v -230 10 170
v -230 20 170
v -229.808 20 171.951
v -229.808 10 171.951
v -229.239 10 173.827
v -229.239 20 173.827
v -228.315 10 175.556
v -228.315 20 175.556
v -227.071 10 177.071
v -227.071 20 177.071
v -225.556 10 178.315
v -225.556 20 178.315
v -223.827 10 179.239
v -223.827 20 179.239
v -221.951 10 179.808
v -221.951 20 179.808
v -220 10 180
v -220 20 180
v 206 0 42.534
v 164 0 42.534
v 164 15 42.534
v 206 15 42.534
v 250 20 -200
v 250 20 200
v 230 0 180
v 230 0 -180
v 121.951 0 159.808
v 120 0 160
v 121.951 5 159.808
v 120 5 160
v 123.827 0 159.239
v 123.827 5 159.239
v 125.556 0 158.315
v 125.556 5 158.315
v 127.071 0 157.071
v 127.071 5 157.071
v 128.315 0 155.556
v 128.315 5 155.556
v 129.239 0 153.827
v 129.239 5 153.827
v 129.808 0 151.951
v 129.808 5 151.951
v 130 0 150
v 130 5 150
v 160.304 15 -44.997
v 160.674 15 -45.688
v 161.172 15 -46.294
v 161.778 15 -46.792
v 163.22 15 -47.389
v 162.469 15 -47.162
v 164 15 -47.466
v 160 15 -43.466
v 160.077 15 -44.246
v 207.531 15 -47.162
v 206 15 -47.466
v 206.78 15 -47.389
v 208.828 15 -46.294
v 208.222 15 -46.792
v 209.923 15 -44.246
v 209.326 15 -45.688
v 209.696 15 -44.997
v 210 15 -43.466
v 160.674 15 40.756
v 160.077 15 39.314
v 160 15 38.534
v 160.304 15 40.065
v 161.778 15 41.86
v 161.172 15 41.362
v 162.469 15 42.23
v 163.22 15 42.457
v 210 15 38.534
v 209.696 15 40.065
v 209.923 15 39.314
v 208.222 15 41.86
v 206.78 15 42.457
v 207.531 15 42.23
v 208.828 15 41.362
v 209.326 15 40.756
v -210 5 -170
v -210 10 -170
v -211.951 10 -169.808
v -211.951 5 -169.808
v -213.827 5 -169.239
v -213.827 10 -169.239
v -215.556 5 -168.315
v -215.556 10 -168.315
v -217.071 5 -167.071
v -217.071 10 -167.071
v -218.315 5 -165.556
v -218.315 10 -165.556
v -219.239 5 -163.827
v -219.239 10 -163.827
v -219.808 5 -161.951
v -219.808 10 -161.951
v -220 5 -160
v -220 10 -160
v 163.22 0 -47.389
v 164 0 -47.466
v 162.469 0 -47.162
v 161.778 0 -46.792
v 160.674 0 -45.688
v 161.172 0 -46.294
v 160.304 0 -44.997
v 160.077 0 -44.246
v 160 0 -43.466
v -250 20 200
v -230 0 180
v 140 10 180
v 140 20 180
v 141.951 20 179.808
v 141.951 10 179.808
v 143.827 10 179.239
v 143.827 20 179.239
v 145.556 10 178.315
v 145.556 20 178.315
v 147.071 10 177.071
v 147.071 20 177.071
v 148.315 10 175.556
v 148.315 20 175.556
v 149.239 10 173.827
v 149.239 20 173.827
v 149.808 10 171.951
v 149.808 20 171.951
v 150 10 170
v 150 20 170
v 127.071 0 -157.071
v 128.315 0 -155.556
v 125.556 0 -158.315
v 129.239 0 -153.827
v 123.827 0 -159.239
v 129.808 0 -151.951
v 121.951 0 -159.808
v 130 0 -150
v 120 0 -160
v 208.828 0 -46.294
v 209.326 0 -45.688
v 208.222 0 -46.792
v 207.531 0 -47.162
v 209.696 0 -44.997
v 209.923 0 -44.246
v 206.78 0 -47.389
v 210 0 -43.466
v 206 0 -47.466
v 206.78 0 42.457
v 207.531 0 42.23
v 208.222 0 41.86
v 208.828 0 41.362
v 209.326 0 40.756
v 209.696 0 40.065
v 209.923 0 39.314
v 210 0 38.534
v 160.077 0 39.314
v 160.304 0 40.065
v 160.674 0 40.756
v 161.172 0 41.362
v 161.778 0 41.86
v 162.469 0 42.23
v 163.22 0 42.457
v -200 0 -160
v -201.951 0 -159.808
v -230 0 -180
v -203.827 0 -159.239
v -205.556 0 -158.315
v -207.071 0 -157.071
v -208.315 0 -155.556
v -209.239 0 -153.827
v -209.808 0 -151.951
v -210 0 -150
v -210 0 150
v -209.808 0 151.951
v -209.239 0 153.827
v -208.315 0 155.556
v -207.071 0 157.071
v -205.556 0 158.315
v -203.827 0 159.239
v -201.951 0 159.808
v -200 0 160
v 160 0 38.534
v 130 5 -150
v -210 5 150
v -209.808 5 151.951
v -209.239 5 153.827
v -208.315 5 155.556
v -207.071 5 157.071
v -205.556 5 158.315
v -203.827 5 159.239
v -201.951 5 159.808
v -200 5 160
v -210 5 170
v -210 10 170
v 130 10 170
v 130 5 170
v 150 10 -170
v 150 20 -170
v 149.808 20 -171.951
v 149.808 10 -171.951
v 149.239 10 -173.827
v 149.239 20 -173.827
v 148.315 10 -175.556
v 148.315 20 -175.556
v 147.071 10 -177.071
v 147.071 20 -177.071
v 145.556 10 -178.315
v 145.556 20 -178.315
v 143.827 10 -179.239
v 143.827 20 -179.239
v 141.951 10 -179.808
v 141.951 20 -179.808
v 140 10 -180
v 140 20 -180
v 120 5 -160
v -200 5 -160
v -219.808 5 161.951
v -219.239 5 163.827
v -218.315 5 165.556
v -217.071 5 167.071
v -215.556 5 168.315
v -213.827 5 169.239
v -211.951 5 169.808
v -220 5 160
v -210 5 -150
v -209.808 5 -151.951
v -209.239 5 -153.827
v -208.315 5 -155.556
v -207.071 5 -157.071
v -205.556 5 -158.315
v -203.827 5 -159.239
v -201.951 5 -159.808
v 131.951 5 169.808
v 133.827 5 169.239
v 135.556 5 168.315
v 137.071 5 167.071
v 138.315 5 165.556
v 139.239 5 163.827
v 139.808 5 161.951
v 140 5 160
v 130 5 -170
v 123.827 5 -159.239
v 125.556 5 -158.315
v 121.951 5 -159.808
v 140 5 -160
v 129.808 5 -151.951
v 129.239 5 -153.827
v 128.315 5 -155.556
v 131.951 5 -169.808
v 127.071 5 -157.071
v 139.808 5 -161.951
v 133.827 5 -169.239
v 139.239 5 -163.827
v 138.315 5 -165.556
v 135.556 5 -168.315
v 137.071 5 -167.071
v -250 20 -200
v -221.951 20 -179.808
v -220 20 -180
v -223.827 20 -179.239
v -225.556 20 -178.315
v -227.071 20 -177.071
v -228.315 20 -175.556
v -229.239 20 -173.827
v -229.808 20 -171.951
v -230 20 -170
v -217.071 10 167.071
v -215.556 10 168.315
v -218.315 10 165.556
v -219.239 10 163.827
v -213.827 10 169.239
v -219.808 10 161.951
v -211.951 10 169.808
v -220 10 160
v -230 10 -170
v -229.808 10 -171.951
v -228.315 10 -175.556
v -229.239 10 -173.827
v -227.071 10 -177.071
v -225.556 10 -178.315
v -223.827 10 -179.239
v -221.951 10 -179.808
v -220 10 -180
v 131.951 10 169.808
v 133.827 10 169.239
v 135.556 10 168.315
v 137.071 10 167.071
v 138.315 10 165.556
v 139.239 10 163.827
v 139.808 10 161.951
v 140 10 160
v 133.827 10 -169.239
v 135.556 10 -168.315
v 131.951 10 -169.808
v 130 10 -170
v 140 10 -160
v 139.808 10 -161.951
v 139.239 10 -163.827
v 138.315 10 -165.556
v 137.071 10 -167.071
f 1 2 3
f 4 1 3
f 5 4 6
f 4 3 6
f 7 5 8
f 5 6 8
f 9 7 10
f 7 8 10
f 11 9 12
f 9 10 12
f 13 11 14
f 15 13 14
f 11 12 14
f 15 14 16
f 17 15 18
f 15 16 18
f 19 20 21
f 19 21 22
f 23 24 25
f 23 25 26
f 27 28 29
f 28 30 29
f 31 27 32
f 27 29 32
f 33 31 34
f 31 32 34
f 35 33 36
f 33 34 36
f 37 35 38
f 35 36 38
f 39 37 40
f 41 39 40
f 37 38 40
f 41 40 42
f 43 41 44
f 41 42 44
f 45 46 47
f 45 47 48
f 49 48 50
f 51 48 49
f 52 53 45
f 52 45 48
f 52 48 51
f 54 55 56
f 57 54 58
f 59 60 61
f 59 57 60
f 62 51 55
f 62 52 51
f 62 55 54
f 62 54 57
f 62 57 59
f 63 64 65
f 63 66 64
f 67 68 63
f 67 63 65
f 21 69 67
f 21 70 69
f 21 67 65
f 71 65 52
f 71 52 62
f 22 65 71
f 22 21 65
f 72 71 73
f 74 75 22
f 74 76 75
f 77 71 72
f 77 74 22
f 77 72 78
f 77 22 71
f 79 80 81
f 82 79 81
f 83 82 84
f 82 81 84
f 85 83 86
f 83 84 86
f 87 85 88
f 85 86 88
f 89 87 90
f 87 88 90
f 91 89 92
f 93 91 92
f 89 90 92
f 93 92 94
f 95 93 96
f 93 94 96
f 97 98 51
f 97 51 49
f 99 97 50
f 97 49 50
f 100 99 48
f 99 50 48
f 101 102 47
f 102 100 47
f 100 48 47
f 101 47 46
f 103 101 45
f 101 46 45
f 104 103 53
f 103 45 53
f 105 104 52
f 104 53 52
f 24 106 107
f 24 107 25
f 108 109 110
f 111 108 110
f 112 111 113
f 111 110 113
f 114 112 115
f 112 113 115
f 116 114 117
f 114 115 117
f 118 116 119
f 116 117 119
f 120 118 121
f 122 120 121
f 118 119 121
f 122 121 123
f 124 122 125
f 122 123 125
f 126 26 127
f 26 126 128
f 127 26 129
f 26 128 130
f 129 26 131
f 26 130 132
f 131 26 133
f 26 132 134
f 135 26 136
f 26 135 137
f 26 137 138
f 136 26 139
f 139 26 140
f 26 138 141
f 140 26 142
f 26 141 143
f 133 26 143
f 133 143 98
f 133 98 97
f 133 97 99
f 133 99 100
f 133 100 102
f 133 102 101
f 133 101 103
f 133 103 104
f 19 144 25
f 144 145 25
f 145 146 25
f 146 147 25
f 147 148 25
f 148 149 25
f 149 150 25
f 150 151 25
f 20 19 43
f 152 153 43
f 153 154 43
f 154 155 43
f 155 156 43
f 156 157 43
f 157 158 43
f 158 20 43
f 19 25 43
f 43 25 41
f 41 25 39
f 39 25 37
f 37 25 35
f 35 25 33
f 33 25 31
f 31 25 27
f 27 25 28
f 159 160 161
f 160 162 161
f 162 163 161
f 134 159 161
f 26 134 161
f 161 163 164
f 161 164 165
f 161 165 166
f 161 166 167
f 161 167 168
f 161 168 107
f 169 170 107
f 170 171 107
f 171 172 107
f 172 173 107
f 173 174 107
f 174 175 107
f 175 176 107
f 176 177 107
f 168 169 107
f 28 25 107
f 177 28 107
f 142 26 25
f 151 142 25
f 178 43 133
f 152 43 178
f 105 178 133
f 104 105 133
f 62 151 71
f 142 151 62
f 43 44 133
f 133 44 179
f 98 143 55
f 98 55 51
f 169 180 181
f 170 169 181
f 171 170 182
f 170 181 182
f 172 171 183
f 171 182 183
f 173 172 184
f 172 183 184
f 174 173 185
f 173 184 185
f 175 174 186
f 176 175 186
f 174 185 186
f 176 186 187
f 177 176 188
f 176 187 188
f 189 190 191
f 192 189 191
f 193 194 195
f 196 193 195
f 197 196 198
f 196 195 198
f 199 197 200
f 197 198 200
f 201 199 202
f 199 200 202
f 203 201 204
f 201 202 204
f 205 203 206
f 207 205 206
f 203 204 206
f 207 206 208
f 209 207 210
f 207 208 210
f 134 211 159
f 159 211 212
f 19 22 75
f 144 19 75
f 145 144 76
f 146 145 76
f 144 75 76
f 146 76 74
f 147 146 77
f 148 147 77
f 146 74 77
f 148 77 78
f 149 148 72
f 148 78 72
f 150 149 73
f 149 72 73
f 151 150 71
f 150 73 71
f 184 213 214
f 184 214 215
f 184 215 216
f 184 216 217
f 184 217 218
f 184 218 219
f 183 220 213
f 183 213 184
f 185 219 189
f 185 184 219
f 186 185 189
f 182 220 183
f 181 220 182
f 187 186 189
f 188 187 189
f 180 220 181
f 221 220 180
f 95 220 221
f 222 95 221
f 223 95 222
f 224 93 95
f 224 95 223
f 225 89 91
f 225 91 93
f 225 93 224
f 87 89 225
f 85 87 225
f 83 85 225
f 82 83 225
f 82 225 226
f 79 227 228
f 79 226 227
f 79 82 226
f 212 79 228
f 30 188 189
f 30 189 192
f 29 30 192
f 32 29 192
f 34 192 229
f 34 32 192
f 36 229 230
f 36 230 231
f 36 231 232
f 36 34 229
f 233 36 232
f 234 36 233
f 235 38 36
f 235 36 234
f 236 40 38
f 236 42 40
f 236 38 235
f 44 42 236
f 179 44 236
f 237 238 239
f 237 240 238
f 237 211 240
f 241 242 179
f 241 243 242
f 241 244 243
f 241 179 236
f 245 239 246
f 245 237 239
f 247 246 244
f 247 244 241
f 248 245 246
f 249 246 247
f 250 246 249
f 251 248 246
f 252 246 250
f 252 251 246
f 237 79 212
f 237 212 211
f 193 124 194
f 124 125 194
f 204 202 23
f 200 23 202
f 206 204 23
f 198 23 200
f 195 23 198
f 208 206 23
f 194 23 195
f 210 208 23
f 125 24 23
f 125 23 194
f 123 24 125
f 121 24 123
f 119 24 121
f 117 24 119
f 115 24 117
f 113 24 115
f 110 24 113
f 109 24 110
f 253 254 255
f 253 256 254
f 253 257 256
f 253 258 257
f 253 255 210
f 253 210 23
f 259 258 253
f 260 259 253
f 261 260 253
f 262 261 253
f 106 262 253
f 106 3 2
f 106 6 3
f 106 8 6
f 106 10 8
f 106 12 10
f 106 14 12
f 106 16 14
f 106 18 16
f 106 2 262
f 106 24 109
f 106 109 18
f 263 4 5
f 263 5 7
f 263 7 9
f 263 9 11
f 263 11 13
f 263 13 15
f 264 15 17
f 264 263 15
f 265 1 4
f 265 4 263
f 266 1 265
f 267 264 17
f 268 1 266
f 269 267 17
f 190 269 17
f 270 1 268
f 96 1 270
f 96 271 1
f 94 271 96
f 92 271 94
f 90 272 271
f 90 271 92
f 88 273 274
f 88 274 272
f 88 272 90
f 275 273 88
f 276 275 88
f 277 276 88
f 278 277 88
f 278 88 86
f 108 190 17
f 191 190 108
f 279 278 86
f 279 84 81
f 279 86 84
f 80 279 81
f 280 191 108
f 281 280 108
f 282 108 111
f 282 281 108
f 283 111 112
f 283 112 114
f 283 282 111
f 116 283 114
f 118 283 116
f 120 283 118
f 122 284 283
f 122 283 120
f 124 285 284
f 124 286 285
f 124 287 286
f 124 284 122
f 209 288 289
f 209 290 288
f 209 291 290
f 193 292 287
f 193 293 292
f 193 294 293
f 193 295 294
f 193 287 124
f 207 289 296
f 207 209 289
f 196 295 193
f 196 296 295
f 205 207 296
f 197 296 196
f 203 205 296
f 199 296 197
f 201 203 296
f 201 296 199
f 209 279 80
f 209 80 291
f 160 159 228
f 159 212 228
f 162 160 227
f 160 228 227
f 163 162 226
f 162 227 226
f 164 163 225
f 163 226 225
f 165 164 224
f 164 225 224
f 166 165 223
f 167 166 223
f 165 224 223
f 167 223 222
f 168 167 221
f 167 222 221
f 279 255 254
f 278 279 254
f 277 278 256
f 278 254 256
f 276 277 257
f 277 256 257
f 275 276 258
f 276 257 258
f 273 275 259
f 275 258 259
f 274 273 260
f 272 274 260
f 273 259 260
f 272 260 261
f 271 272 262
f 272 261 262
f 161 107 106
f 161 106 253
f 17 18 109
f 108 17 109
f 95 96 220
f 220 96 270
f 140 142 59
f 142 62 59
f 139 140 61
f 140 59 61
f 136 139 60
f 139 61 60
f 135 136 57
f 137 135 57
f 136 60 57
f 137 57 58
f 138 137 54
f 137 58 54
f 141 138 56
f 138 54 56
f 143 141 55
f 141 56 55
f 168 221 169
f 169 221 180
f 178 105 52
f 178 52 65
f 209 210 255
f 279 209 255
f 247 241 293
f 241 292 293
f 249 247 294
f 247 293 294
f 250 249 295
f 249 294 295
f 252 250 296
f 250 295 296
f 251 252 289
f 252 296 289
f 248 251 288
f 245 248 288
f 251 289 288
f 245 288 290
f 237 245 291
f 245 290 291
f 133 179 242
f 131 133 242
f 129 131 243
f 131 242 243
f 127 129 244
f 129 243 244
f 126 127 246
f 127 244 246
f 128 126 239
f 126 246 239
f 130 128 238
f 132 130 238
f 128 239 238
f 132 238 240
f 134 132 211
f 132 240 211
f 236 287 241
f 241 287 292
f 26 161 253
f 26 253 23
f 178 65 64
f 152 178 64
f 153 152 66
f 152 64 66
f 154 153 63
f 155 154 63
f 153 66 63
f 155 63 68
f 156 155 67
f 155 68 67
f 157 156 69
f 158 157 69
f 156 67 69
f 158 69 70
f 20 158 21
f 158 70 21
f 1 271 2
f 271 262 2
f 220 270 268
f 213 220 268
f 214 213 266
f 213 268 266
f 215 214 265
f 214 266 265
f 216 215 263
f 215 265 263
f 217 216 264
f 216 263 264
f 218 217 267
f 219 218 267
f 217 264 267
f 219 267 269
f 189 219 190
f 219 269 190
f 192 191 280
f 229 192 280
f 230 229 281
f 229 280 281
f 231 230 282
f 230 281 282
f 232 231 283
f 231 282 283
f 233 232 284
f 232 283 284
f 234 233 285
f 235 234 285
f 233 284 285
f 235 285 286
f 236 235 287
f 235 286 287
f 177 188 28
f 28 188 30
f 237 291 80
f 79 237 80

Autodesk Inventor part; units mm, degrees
ref_plane "YZ Plane" through (0, 0, 0) normal (1, 0, 0) x (0, 1, 0)
ref_plane "XZ Plane" through (0, 0, 0) normal (0, 1, 0) x (-1, 0, 0)
ref_plane "XY Plane" through (0, 0, 0) normal (0, 0, 1) x (1, 0, 0)
sketch "Skizze1" plane through (0, 0, 0) normal (0, 1, 0) x (-1, 0, 0)
  line L0 (350, 0) -> (-350, 0) projected
  line L1 (0, -280) -> (0, 280) projected
  line L2 (250, 200) -> (-250, 200)
  line L3 (-250, 200) -> (-250, -200)
  line L4 (-250, -200) -> (250, -200)
  line L5 (250, -200) -> (250, 200)
  point P0 (0, 0)
  dimension "d0" = 400
  dimension "d1" = 500
extrude "Extrusion1" add sketch "Skizze1" along normal blind 20
chamfer "Fase1" distance 20 angle 45 4 edges at (-250, 0, 0) (0, 0, 200) (250, 0, 0) (0, 0, -200)
sketch "Skizze2" plane through (0, 20, 0) normal (0, 1, 0) x (1, 0, 0)
  line L0 (250, -200) -> (250, 200) projected
  line L1 (250, 200) -> (-250, 200) projected
  line L2 (-250, -200) -> (250, -200) projected
  line L3 (250, 200) -> (150, 200)
  line L4 (150, 200) -> (150, -200)
  line L5 (150, -200) -> (250, -200)
  line L6 (250, -200) -> (250, 200)
  point P0 (0, 0)
  dimension "d7" = 100
sketch "Skizze7" plane through (0, 20, 0) normal (0, 1, 0) x (1, 0, 0)
  line L0 (-250, -200) -> (250, -200) projected
  line L1 (250, -200) -> (250, 200) projected
  line L2 (250, 200) -> (-250, 200) projected
  line L3 (-250, 200) -> (-250, -200) projected
  line L4 (-350, 261.6691) -> (350, 261.6691)
  line L5 (-220, -180) -> (140, -180)
  line L6 (150, -170) -> (150, 170)
  line L7 (140, 180) -> (-220, 180)
  line L8 (-230, 170) -> (-230, -170)
  arc A0 (-230, -170) -> (-220, -180) centre (-220, -170) ccw
  arc A1 (-220, 180) -> (-230, 170) centre (-220, 170) ccw
  arc A2 (150, 170) -> (140, 180) centre (140, 170) ccw
  arc A3 (140, -180) -> (150, -170) centre (140, -170) ccw
  point P0 (0, 0)
  point P1 (458.9826, 261.6691)
  point P2 (-230, -180)
  point P3 (150, 180)
  point P4 (150, -180)
  point P5 (-230, 180)
  dimension "d35" = 380
  dimension "d37" = 20
  dimension "d38" = 20
  dimension "d41" = 10
  dimension "d53" = 20
extrude "Extrusion6" cut sketch "Skizze7" against normal blind 10 contours A0 L8 A1 L7 A2 L6 A3 L5
sketch "Skizze6" plane through (0, 0, 0) normal (0, -1, 0) x (1, 0, 0)
  line L0 (230, 180) -> (230, -180) projected
  line L1 (-350, 0) -> (350, 0) projected
  line L2 (160, 42.534) -> (210, 42.534)
  line L3 (210, 42.534) -> (210, -47.466)
  line L4 (210, -47.466) -> (160, -47.466)
  line L5 (160, -47.466) -> (160, 42.534)
  point P0 (0, 0)
  dimension "d23" = 50
  dimension "d24" = 90
  dimension "d25" = 20
extrude "Extrusion5" cut sketch "Skizze6" against normal blind 15
fillet "Rundung1" radius 4 4 edges at (160, 7.5, 42.534) (210, 7.5, 42.534) (210, 7.5, -47.466) (160, 7.5, -47.466)
sketch "Skizze8" plane through (0, 10, 0) normal (0, 1, 0) x (1, 0, 0)
  arc A0 (140, -180) -> (150, -170) centre (140, -170) ccw projected
  line L0 (150, 170) -> (150, -170) projected
  arc A1 (150, 170) -> (140, 180) centre (140, 170) ccw projected
  arc A2 (-220, 180) -> (-230, 170) centre (-220, 170) ccw projected
  line L1 (-230, -170) -> (-230, 170) projected
  arc A3 (-230, -170) -> (-220, -180) centre (-220, -170) ccw projected
  line L2 (-220, 180) -> (140, 180) projected
  line L3 (-210, -170) -> (130, -170)
  line L4 (140, -160) -> (140, 160)
  line L5 (130, 170) -> (-210, 170)
  line L6 (-220, 160) -> (-220, -160)
  arc A4 (-220, -160) -> (-210, -170) centre (-210, -160) ccw
  arc A5 (130, -170) -> (140, -160) centre (130, -160) ccw
  arc A6 (140, 160) -> (130, 170) centre (130, 160) ccw
  arc A7 (-210, 170) -> (-220, 160) centre (-210, 160) ccw
  line L7 (140, -180) -> (-220, -180) projected
  line L8 (-220, 180) -> (140, 180) projected
  point P0 (0, 0)
  dimension "d43" = 10
  dimension "d45" = 10
  dimension "d46" = 10
  dimension "d54" = 10
  dimension "d57" = 10
extrude "Extrusion7" cut sketch "Skizze8" against normal blind 5 contours A4 L6 A7 L5 A6 L4 A5 L3
sketch "Skizze9" plane through (0, 5, 0) normal (0, 1, 0) x (1, 0, 0)
  line L0 (130, -170) -> (-210, -170) projected
  arc A0 (130, -170) -> (140, -160) centre (130, -160) ccw projected
  line L1 (140, 160) -> (140, -160) projected
  arc A1 (140, 160) -> (130, 170) centre (130, 160) ccw projected
  line L2 (-210, 170) -> (130, 170) projected
  arc A2 (-210, 170) -> (-220, 160) centre (-210, 160) ccw projected
  line L3 (-220, -160) -> (-220, 160) projected
  arc A3 (-220, -160) -> (-210, -170) centre (-210, -160) ccw projected
  line L4 (-200, -160) -> (120, -160)
  line L5 (130, -150) -> (130, 150)
  line L6 (120, 160) -> (-200, 160)
  line L7 (-210, 150) -> (-210, -150)
  arc A4 (-210, -150) -> (-200, -160) centre (-200, -150) ccw
  arc A5 (-200, 160) -> (-210, 150) centre (-200, 150) ccw
  arc A6 (130, 150) -> (120, 160) centre (120, 150) ccw
  arc A7 (120, -160) -> (130, -150) centre (120, -150) ccw
  point P0 (0, 0)
  dimension "d49" = 10
extrude "Extrusion8" cut sketch "Skizze9" against normal blind 5 contours A4 L7 A5 L6 A6 L5 A7 L4
properties part number "SitzFläche"
